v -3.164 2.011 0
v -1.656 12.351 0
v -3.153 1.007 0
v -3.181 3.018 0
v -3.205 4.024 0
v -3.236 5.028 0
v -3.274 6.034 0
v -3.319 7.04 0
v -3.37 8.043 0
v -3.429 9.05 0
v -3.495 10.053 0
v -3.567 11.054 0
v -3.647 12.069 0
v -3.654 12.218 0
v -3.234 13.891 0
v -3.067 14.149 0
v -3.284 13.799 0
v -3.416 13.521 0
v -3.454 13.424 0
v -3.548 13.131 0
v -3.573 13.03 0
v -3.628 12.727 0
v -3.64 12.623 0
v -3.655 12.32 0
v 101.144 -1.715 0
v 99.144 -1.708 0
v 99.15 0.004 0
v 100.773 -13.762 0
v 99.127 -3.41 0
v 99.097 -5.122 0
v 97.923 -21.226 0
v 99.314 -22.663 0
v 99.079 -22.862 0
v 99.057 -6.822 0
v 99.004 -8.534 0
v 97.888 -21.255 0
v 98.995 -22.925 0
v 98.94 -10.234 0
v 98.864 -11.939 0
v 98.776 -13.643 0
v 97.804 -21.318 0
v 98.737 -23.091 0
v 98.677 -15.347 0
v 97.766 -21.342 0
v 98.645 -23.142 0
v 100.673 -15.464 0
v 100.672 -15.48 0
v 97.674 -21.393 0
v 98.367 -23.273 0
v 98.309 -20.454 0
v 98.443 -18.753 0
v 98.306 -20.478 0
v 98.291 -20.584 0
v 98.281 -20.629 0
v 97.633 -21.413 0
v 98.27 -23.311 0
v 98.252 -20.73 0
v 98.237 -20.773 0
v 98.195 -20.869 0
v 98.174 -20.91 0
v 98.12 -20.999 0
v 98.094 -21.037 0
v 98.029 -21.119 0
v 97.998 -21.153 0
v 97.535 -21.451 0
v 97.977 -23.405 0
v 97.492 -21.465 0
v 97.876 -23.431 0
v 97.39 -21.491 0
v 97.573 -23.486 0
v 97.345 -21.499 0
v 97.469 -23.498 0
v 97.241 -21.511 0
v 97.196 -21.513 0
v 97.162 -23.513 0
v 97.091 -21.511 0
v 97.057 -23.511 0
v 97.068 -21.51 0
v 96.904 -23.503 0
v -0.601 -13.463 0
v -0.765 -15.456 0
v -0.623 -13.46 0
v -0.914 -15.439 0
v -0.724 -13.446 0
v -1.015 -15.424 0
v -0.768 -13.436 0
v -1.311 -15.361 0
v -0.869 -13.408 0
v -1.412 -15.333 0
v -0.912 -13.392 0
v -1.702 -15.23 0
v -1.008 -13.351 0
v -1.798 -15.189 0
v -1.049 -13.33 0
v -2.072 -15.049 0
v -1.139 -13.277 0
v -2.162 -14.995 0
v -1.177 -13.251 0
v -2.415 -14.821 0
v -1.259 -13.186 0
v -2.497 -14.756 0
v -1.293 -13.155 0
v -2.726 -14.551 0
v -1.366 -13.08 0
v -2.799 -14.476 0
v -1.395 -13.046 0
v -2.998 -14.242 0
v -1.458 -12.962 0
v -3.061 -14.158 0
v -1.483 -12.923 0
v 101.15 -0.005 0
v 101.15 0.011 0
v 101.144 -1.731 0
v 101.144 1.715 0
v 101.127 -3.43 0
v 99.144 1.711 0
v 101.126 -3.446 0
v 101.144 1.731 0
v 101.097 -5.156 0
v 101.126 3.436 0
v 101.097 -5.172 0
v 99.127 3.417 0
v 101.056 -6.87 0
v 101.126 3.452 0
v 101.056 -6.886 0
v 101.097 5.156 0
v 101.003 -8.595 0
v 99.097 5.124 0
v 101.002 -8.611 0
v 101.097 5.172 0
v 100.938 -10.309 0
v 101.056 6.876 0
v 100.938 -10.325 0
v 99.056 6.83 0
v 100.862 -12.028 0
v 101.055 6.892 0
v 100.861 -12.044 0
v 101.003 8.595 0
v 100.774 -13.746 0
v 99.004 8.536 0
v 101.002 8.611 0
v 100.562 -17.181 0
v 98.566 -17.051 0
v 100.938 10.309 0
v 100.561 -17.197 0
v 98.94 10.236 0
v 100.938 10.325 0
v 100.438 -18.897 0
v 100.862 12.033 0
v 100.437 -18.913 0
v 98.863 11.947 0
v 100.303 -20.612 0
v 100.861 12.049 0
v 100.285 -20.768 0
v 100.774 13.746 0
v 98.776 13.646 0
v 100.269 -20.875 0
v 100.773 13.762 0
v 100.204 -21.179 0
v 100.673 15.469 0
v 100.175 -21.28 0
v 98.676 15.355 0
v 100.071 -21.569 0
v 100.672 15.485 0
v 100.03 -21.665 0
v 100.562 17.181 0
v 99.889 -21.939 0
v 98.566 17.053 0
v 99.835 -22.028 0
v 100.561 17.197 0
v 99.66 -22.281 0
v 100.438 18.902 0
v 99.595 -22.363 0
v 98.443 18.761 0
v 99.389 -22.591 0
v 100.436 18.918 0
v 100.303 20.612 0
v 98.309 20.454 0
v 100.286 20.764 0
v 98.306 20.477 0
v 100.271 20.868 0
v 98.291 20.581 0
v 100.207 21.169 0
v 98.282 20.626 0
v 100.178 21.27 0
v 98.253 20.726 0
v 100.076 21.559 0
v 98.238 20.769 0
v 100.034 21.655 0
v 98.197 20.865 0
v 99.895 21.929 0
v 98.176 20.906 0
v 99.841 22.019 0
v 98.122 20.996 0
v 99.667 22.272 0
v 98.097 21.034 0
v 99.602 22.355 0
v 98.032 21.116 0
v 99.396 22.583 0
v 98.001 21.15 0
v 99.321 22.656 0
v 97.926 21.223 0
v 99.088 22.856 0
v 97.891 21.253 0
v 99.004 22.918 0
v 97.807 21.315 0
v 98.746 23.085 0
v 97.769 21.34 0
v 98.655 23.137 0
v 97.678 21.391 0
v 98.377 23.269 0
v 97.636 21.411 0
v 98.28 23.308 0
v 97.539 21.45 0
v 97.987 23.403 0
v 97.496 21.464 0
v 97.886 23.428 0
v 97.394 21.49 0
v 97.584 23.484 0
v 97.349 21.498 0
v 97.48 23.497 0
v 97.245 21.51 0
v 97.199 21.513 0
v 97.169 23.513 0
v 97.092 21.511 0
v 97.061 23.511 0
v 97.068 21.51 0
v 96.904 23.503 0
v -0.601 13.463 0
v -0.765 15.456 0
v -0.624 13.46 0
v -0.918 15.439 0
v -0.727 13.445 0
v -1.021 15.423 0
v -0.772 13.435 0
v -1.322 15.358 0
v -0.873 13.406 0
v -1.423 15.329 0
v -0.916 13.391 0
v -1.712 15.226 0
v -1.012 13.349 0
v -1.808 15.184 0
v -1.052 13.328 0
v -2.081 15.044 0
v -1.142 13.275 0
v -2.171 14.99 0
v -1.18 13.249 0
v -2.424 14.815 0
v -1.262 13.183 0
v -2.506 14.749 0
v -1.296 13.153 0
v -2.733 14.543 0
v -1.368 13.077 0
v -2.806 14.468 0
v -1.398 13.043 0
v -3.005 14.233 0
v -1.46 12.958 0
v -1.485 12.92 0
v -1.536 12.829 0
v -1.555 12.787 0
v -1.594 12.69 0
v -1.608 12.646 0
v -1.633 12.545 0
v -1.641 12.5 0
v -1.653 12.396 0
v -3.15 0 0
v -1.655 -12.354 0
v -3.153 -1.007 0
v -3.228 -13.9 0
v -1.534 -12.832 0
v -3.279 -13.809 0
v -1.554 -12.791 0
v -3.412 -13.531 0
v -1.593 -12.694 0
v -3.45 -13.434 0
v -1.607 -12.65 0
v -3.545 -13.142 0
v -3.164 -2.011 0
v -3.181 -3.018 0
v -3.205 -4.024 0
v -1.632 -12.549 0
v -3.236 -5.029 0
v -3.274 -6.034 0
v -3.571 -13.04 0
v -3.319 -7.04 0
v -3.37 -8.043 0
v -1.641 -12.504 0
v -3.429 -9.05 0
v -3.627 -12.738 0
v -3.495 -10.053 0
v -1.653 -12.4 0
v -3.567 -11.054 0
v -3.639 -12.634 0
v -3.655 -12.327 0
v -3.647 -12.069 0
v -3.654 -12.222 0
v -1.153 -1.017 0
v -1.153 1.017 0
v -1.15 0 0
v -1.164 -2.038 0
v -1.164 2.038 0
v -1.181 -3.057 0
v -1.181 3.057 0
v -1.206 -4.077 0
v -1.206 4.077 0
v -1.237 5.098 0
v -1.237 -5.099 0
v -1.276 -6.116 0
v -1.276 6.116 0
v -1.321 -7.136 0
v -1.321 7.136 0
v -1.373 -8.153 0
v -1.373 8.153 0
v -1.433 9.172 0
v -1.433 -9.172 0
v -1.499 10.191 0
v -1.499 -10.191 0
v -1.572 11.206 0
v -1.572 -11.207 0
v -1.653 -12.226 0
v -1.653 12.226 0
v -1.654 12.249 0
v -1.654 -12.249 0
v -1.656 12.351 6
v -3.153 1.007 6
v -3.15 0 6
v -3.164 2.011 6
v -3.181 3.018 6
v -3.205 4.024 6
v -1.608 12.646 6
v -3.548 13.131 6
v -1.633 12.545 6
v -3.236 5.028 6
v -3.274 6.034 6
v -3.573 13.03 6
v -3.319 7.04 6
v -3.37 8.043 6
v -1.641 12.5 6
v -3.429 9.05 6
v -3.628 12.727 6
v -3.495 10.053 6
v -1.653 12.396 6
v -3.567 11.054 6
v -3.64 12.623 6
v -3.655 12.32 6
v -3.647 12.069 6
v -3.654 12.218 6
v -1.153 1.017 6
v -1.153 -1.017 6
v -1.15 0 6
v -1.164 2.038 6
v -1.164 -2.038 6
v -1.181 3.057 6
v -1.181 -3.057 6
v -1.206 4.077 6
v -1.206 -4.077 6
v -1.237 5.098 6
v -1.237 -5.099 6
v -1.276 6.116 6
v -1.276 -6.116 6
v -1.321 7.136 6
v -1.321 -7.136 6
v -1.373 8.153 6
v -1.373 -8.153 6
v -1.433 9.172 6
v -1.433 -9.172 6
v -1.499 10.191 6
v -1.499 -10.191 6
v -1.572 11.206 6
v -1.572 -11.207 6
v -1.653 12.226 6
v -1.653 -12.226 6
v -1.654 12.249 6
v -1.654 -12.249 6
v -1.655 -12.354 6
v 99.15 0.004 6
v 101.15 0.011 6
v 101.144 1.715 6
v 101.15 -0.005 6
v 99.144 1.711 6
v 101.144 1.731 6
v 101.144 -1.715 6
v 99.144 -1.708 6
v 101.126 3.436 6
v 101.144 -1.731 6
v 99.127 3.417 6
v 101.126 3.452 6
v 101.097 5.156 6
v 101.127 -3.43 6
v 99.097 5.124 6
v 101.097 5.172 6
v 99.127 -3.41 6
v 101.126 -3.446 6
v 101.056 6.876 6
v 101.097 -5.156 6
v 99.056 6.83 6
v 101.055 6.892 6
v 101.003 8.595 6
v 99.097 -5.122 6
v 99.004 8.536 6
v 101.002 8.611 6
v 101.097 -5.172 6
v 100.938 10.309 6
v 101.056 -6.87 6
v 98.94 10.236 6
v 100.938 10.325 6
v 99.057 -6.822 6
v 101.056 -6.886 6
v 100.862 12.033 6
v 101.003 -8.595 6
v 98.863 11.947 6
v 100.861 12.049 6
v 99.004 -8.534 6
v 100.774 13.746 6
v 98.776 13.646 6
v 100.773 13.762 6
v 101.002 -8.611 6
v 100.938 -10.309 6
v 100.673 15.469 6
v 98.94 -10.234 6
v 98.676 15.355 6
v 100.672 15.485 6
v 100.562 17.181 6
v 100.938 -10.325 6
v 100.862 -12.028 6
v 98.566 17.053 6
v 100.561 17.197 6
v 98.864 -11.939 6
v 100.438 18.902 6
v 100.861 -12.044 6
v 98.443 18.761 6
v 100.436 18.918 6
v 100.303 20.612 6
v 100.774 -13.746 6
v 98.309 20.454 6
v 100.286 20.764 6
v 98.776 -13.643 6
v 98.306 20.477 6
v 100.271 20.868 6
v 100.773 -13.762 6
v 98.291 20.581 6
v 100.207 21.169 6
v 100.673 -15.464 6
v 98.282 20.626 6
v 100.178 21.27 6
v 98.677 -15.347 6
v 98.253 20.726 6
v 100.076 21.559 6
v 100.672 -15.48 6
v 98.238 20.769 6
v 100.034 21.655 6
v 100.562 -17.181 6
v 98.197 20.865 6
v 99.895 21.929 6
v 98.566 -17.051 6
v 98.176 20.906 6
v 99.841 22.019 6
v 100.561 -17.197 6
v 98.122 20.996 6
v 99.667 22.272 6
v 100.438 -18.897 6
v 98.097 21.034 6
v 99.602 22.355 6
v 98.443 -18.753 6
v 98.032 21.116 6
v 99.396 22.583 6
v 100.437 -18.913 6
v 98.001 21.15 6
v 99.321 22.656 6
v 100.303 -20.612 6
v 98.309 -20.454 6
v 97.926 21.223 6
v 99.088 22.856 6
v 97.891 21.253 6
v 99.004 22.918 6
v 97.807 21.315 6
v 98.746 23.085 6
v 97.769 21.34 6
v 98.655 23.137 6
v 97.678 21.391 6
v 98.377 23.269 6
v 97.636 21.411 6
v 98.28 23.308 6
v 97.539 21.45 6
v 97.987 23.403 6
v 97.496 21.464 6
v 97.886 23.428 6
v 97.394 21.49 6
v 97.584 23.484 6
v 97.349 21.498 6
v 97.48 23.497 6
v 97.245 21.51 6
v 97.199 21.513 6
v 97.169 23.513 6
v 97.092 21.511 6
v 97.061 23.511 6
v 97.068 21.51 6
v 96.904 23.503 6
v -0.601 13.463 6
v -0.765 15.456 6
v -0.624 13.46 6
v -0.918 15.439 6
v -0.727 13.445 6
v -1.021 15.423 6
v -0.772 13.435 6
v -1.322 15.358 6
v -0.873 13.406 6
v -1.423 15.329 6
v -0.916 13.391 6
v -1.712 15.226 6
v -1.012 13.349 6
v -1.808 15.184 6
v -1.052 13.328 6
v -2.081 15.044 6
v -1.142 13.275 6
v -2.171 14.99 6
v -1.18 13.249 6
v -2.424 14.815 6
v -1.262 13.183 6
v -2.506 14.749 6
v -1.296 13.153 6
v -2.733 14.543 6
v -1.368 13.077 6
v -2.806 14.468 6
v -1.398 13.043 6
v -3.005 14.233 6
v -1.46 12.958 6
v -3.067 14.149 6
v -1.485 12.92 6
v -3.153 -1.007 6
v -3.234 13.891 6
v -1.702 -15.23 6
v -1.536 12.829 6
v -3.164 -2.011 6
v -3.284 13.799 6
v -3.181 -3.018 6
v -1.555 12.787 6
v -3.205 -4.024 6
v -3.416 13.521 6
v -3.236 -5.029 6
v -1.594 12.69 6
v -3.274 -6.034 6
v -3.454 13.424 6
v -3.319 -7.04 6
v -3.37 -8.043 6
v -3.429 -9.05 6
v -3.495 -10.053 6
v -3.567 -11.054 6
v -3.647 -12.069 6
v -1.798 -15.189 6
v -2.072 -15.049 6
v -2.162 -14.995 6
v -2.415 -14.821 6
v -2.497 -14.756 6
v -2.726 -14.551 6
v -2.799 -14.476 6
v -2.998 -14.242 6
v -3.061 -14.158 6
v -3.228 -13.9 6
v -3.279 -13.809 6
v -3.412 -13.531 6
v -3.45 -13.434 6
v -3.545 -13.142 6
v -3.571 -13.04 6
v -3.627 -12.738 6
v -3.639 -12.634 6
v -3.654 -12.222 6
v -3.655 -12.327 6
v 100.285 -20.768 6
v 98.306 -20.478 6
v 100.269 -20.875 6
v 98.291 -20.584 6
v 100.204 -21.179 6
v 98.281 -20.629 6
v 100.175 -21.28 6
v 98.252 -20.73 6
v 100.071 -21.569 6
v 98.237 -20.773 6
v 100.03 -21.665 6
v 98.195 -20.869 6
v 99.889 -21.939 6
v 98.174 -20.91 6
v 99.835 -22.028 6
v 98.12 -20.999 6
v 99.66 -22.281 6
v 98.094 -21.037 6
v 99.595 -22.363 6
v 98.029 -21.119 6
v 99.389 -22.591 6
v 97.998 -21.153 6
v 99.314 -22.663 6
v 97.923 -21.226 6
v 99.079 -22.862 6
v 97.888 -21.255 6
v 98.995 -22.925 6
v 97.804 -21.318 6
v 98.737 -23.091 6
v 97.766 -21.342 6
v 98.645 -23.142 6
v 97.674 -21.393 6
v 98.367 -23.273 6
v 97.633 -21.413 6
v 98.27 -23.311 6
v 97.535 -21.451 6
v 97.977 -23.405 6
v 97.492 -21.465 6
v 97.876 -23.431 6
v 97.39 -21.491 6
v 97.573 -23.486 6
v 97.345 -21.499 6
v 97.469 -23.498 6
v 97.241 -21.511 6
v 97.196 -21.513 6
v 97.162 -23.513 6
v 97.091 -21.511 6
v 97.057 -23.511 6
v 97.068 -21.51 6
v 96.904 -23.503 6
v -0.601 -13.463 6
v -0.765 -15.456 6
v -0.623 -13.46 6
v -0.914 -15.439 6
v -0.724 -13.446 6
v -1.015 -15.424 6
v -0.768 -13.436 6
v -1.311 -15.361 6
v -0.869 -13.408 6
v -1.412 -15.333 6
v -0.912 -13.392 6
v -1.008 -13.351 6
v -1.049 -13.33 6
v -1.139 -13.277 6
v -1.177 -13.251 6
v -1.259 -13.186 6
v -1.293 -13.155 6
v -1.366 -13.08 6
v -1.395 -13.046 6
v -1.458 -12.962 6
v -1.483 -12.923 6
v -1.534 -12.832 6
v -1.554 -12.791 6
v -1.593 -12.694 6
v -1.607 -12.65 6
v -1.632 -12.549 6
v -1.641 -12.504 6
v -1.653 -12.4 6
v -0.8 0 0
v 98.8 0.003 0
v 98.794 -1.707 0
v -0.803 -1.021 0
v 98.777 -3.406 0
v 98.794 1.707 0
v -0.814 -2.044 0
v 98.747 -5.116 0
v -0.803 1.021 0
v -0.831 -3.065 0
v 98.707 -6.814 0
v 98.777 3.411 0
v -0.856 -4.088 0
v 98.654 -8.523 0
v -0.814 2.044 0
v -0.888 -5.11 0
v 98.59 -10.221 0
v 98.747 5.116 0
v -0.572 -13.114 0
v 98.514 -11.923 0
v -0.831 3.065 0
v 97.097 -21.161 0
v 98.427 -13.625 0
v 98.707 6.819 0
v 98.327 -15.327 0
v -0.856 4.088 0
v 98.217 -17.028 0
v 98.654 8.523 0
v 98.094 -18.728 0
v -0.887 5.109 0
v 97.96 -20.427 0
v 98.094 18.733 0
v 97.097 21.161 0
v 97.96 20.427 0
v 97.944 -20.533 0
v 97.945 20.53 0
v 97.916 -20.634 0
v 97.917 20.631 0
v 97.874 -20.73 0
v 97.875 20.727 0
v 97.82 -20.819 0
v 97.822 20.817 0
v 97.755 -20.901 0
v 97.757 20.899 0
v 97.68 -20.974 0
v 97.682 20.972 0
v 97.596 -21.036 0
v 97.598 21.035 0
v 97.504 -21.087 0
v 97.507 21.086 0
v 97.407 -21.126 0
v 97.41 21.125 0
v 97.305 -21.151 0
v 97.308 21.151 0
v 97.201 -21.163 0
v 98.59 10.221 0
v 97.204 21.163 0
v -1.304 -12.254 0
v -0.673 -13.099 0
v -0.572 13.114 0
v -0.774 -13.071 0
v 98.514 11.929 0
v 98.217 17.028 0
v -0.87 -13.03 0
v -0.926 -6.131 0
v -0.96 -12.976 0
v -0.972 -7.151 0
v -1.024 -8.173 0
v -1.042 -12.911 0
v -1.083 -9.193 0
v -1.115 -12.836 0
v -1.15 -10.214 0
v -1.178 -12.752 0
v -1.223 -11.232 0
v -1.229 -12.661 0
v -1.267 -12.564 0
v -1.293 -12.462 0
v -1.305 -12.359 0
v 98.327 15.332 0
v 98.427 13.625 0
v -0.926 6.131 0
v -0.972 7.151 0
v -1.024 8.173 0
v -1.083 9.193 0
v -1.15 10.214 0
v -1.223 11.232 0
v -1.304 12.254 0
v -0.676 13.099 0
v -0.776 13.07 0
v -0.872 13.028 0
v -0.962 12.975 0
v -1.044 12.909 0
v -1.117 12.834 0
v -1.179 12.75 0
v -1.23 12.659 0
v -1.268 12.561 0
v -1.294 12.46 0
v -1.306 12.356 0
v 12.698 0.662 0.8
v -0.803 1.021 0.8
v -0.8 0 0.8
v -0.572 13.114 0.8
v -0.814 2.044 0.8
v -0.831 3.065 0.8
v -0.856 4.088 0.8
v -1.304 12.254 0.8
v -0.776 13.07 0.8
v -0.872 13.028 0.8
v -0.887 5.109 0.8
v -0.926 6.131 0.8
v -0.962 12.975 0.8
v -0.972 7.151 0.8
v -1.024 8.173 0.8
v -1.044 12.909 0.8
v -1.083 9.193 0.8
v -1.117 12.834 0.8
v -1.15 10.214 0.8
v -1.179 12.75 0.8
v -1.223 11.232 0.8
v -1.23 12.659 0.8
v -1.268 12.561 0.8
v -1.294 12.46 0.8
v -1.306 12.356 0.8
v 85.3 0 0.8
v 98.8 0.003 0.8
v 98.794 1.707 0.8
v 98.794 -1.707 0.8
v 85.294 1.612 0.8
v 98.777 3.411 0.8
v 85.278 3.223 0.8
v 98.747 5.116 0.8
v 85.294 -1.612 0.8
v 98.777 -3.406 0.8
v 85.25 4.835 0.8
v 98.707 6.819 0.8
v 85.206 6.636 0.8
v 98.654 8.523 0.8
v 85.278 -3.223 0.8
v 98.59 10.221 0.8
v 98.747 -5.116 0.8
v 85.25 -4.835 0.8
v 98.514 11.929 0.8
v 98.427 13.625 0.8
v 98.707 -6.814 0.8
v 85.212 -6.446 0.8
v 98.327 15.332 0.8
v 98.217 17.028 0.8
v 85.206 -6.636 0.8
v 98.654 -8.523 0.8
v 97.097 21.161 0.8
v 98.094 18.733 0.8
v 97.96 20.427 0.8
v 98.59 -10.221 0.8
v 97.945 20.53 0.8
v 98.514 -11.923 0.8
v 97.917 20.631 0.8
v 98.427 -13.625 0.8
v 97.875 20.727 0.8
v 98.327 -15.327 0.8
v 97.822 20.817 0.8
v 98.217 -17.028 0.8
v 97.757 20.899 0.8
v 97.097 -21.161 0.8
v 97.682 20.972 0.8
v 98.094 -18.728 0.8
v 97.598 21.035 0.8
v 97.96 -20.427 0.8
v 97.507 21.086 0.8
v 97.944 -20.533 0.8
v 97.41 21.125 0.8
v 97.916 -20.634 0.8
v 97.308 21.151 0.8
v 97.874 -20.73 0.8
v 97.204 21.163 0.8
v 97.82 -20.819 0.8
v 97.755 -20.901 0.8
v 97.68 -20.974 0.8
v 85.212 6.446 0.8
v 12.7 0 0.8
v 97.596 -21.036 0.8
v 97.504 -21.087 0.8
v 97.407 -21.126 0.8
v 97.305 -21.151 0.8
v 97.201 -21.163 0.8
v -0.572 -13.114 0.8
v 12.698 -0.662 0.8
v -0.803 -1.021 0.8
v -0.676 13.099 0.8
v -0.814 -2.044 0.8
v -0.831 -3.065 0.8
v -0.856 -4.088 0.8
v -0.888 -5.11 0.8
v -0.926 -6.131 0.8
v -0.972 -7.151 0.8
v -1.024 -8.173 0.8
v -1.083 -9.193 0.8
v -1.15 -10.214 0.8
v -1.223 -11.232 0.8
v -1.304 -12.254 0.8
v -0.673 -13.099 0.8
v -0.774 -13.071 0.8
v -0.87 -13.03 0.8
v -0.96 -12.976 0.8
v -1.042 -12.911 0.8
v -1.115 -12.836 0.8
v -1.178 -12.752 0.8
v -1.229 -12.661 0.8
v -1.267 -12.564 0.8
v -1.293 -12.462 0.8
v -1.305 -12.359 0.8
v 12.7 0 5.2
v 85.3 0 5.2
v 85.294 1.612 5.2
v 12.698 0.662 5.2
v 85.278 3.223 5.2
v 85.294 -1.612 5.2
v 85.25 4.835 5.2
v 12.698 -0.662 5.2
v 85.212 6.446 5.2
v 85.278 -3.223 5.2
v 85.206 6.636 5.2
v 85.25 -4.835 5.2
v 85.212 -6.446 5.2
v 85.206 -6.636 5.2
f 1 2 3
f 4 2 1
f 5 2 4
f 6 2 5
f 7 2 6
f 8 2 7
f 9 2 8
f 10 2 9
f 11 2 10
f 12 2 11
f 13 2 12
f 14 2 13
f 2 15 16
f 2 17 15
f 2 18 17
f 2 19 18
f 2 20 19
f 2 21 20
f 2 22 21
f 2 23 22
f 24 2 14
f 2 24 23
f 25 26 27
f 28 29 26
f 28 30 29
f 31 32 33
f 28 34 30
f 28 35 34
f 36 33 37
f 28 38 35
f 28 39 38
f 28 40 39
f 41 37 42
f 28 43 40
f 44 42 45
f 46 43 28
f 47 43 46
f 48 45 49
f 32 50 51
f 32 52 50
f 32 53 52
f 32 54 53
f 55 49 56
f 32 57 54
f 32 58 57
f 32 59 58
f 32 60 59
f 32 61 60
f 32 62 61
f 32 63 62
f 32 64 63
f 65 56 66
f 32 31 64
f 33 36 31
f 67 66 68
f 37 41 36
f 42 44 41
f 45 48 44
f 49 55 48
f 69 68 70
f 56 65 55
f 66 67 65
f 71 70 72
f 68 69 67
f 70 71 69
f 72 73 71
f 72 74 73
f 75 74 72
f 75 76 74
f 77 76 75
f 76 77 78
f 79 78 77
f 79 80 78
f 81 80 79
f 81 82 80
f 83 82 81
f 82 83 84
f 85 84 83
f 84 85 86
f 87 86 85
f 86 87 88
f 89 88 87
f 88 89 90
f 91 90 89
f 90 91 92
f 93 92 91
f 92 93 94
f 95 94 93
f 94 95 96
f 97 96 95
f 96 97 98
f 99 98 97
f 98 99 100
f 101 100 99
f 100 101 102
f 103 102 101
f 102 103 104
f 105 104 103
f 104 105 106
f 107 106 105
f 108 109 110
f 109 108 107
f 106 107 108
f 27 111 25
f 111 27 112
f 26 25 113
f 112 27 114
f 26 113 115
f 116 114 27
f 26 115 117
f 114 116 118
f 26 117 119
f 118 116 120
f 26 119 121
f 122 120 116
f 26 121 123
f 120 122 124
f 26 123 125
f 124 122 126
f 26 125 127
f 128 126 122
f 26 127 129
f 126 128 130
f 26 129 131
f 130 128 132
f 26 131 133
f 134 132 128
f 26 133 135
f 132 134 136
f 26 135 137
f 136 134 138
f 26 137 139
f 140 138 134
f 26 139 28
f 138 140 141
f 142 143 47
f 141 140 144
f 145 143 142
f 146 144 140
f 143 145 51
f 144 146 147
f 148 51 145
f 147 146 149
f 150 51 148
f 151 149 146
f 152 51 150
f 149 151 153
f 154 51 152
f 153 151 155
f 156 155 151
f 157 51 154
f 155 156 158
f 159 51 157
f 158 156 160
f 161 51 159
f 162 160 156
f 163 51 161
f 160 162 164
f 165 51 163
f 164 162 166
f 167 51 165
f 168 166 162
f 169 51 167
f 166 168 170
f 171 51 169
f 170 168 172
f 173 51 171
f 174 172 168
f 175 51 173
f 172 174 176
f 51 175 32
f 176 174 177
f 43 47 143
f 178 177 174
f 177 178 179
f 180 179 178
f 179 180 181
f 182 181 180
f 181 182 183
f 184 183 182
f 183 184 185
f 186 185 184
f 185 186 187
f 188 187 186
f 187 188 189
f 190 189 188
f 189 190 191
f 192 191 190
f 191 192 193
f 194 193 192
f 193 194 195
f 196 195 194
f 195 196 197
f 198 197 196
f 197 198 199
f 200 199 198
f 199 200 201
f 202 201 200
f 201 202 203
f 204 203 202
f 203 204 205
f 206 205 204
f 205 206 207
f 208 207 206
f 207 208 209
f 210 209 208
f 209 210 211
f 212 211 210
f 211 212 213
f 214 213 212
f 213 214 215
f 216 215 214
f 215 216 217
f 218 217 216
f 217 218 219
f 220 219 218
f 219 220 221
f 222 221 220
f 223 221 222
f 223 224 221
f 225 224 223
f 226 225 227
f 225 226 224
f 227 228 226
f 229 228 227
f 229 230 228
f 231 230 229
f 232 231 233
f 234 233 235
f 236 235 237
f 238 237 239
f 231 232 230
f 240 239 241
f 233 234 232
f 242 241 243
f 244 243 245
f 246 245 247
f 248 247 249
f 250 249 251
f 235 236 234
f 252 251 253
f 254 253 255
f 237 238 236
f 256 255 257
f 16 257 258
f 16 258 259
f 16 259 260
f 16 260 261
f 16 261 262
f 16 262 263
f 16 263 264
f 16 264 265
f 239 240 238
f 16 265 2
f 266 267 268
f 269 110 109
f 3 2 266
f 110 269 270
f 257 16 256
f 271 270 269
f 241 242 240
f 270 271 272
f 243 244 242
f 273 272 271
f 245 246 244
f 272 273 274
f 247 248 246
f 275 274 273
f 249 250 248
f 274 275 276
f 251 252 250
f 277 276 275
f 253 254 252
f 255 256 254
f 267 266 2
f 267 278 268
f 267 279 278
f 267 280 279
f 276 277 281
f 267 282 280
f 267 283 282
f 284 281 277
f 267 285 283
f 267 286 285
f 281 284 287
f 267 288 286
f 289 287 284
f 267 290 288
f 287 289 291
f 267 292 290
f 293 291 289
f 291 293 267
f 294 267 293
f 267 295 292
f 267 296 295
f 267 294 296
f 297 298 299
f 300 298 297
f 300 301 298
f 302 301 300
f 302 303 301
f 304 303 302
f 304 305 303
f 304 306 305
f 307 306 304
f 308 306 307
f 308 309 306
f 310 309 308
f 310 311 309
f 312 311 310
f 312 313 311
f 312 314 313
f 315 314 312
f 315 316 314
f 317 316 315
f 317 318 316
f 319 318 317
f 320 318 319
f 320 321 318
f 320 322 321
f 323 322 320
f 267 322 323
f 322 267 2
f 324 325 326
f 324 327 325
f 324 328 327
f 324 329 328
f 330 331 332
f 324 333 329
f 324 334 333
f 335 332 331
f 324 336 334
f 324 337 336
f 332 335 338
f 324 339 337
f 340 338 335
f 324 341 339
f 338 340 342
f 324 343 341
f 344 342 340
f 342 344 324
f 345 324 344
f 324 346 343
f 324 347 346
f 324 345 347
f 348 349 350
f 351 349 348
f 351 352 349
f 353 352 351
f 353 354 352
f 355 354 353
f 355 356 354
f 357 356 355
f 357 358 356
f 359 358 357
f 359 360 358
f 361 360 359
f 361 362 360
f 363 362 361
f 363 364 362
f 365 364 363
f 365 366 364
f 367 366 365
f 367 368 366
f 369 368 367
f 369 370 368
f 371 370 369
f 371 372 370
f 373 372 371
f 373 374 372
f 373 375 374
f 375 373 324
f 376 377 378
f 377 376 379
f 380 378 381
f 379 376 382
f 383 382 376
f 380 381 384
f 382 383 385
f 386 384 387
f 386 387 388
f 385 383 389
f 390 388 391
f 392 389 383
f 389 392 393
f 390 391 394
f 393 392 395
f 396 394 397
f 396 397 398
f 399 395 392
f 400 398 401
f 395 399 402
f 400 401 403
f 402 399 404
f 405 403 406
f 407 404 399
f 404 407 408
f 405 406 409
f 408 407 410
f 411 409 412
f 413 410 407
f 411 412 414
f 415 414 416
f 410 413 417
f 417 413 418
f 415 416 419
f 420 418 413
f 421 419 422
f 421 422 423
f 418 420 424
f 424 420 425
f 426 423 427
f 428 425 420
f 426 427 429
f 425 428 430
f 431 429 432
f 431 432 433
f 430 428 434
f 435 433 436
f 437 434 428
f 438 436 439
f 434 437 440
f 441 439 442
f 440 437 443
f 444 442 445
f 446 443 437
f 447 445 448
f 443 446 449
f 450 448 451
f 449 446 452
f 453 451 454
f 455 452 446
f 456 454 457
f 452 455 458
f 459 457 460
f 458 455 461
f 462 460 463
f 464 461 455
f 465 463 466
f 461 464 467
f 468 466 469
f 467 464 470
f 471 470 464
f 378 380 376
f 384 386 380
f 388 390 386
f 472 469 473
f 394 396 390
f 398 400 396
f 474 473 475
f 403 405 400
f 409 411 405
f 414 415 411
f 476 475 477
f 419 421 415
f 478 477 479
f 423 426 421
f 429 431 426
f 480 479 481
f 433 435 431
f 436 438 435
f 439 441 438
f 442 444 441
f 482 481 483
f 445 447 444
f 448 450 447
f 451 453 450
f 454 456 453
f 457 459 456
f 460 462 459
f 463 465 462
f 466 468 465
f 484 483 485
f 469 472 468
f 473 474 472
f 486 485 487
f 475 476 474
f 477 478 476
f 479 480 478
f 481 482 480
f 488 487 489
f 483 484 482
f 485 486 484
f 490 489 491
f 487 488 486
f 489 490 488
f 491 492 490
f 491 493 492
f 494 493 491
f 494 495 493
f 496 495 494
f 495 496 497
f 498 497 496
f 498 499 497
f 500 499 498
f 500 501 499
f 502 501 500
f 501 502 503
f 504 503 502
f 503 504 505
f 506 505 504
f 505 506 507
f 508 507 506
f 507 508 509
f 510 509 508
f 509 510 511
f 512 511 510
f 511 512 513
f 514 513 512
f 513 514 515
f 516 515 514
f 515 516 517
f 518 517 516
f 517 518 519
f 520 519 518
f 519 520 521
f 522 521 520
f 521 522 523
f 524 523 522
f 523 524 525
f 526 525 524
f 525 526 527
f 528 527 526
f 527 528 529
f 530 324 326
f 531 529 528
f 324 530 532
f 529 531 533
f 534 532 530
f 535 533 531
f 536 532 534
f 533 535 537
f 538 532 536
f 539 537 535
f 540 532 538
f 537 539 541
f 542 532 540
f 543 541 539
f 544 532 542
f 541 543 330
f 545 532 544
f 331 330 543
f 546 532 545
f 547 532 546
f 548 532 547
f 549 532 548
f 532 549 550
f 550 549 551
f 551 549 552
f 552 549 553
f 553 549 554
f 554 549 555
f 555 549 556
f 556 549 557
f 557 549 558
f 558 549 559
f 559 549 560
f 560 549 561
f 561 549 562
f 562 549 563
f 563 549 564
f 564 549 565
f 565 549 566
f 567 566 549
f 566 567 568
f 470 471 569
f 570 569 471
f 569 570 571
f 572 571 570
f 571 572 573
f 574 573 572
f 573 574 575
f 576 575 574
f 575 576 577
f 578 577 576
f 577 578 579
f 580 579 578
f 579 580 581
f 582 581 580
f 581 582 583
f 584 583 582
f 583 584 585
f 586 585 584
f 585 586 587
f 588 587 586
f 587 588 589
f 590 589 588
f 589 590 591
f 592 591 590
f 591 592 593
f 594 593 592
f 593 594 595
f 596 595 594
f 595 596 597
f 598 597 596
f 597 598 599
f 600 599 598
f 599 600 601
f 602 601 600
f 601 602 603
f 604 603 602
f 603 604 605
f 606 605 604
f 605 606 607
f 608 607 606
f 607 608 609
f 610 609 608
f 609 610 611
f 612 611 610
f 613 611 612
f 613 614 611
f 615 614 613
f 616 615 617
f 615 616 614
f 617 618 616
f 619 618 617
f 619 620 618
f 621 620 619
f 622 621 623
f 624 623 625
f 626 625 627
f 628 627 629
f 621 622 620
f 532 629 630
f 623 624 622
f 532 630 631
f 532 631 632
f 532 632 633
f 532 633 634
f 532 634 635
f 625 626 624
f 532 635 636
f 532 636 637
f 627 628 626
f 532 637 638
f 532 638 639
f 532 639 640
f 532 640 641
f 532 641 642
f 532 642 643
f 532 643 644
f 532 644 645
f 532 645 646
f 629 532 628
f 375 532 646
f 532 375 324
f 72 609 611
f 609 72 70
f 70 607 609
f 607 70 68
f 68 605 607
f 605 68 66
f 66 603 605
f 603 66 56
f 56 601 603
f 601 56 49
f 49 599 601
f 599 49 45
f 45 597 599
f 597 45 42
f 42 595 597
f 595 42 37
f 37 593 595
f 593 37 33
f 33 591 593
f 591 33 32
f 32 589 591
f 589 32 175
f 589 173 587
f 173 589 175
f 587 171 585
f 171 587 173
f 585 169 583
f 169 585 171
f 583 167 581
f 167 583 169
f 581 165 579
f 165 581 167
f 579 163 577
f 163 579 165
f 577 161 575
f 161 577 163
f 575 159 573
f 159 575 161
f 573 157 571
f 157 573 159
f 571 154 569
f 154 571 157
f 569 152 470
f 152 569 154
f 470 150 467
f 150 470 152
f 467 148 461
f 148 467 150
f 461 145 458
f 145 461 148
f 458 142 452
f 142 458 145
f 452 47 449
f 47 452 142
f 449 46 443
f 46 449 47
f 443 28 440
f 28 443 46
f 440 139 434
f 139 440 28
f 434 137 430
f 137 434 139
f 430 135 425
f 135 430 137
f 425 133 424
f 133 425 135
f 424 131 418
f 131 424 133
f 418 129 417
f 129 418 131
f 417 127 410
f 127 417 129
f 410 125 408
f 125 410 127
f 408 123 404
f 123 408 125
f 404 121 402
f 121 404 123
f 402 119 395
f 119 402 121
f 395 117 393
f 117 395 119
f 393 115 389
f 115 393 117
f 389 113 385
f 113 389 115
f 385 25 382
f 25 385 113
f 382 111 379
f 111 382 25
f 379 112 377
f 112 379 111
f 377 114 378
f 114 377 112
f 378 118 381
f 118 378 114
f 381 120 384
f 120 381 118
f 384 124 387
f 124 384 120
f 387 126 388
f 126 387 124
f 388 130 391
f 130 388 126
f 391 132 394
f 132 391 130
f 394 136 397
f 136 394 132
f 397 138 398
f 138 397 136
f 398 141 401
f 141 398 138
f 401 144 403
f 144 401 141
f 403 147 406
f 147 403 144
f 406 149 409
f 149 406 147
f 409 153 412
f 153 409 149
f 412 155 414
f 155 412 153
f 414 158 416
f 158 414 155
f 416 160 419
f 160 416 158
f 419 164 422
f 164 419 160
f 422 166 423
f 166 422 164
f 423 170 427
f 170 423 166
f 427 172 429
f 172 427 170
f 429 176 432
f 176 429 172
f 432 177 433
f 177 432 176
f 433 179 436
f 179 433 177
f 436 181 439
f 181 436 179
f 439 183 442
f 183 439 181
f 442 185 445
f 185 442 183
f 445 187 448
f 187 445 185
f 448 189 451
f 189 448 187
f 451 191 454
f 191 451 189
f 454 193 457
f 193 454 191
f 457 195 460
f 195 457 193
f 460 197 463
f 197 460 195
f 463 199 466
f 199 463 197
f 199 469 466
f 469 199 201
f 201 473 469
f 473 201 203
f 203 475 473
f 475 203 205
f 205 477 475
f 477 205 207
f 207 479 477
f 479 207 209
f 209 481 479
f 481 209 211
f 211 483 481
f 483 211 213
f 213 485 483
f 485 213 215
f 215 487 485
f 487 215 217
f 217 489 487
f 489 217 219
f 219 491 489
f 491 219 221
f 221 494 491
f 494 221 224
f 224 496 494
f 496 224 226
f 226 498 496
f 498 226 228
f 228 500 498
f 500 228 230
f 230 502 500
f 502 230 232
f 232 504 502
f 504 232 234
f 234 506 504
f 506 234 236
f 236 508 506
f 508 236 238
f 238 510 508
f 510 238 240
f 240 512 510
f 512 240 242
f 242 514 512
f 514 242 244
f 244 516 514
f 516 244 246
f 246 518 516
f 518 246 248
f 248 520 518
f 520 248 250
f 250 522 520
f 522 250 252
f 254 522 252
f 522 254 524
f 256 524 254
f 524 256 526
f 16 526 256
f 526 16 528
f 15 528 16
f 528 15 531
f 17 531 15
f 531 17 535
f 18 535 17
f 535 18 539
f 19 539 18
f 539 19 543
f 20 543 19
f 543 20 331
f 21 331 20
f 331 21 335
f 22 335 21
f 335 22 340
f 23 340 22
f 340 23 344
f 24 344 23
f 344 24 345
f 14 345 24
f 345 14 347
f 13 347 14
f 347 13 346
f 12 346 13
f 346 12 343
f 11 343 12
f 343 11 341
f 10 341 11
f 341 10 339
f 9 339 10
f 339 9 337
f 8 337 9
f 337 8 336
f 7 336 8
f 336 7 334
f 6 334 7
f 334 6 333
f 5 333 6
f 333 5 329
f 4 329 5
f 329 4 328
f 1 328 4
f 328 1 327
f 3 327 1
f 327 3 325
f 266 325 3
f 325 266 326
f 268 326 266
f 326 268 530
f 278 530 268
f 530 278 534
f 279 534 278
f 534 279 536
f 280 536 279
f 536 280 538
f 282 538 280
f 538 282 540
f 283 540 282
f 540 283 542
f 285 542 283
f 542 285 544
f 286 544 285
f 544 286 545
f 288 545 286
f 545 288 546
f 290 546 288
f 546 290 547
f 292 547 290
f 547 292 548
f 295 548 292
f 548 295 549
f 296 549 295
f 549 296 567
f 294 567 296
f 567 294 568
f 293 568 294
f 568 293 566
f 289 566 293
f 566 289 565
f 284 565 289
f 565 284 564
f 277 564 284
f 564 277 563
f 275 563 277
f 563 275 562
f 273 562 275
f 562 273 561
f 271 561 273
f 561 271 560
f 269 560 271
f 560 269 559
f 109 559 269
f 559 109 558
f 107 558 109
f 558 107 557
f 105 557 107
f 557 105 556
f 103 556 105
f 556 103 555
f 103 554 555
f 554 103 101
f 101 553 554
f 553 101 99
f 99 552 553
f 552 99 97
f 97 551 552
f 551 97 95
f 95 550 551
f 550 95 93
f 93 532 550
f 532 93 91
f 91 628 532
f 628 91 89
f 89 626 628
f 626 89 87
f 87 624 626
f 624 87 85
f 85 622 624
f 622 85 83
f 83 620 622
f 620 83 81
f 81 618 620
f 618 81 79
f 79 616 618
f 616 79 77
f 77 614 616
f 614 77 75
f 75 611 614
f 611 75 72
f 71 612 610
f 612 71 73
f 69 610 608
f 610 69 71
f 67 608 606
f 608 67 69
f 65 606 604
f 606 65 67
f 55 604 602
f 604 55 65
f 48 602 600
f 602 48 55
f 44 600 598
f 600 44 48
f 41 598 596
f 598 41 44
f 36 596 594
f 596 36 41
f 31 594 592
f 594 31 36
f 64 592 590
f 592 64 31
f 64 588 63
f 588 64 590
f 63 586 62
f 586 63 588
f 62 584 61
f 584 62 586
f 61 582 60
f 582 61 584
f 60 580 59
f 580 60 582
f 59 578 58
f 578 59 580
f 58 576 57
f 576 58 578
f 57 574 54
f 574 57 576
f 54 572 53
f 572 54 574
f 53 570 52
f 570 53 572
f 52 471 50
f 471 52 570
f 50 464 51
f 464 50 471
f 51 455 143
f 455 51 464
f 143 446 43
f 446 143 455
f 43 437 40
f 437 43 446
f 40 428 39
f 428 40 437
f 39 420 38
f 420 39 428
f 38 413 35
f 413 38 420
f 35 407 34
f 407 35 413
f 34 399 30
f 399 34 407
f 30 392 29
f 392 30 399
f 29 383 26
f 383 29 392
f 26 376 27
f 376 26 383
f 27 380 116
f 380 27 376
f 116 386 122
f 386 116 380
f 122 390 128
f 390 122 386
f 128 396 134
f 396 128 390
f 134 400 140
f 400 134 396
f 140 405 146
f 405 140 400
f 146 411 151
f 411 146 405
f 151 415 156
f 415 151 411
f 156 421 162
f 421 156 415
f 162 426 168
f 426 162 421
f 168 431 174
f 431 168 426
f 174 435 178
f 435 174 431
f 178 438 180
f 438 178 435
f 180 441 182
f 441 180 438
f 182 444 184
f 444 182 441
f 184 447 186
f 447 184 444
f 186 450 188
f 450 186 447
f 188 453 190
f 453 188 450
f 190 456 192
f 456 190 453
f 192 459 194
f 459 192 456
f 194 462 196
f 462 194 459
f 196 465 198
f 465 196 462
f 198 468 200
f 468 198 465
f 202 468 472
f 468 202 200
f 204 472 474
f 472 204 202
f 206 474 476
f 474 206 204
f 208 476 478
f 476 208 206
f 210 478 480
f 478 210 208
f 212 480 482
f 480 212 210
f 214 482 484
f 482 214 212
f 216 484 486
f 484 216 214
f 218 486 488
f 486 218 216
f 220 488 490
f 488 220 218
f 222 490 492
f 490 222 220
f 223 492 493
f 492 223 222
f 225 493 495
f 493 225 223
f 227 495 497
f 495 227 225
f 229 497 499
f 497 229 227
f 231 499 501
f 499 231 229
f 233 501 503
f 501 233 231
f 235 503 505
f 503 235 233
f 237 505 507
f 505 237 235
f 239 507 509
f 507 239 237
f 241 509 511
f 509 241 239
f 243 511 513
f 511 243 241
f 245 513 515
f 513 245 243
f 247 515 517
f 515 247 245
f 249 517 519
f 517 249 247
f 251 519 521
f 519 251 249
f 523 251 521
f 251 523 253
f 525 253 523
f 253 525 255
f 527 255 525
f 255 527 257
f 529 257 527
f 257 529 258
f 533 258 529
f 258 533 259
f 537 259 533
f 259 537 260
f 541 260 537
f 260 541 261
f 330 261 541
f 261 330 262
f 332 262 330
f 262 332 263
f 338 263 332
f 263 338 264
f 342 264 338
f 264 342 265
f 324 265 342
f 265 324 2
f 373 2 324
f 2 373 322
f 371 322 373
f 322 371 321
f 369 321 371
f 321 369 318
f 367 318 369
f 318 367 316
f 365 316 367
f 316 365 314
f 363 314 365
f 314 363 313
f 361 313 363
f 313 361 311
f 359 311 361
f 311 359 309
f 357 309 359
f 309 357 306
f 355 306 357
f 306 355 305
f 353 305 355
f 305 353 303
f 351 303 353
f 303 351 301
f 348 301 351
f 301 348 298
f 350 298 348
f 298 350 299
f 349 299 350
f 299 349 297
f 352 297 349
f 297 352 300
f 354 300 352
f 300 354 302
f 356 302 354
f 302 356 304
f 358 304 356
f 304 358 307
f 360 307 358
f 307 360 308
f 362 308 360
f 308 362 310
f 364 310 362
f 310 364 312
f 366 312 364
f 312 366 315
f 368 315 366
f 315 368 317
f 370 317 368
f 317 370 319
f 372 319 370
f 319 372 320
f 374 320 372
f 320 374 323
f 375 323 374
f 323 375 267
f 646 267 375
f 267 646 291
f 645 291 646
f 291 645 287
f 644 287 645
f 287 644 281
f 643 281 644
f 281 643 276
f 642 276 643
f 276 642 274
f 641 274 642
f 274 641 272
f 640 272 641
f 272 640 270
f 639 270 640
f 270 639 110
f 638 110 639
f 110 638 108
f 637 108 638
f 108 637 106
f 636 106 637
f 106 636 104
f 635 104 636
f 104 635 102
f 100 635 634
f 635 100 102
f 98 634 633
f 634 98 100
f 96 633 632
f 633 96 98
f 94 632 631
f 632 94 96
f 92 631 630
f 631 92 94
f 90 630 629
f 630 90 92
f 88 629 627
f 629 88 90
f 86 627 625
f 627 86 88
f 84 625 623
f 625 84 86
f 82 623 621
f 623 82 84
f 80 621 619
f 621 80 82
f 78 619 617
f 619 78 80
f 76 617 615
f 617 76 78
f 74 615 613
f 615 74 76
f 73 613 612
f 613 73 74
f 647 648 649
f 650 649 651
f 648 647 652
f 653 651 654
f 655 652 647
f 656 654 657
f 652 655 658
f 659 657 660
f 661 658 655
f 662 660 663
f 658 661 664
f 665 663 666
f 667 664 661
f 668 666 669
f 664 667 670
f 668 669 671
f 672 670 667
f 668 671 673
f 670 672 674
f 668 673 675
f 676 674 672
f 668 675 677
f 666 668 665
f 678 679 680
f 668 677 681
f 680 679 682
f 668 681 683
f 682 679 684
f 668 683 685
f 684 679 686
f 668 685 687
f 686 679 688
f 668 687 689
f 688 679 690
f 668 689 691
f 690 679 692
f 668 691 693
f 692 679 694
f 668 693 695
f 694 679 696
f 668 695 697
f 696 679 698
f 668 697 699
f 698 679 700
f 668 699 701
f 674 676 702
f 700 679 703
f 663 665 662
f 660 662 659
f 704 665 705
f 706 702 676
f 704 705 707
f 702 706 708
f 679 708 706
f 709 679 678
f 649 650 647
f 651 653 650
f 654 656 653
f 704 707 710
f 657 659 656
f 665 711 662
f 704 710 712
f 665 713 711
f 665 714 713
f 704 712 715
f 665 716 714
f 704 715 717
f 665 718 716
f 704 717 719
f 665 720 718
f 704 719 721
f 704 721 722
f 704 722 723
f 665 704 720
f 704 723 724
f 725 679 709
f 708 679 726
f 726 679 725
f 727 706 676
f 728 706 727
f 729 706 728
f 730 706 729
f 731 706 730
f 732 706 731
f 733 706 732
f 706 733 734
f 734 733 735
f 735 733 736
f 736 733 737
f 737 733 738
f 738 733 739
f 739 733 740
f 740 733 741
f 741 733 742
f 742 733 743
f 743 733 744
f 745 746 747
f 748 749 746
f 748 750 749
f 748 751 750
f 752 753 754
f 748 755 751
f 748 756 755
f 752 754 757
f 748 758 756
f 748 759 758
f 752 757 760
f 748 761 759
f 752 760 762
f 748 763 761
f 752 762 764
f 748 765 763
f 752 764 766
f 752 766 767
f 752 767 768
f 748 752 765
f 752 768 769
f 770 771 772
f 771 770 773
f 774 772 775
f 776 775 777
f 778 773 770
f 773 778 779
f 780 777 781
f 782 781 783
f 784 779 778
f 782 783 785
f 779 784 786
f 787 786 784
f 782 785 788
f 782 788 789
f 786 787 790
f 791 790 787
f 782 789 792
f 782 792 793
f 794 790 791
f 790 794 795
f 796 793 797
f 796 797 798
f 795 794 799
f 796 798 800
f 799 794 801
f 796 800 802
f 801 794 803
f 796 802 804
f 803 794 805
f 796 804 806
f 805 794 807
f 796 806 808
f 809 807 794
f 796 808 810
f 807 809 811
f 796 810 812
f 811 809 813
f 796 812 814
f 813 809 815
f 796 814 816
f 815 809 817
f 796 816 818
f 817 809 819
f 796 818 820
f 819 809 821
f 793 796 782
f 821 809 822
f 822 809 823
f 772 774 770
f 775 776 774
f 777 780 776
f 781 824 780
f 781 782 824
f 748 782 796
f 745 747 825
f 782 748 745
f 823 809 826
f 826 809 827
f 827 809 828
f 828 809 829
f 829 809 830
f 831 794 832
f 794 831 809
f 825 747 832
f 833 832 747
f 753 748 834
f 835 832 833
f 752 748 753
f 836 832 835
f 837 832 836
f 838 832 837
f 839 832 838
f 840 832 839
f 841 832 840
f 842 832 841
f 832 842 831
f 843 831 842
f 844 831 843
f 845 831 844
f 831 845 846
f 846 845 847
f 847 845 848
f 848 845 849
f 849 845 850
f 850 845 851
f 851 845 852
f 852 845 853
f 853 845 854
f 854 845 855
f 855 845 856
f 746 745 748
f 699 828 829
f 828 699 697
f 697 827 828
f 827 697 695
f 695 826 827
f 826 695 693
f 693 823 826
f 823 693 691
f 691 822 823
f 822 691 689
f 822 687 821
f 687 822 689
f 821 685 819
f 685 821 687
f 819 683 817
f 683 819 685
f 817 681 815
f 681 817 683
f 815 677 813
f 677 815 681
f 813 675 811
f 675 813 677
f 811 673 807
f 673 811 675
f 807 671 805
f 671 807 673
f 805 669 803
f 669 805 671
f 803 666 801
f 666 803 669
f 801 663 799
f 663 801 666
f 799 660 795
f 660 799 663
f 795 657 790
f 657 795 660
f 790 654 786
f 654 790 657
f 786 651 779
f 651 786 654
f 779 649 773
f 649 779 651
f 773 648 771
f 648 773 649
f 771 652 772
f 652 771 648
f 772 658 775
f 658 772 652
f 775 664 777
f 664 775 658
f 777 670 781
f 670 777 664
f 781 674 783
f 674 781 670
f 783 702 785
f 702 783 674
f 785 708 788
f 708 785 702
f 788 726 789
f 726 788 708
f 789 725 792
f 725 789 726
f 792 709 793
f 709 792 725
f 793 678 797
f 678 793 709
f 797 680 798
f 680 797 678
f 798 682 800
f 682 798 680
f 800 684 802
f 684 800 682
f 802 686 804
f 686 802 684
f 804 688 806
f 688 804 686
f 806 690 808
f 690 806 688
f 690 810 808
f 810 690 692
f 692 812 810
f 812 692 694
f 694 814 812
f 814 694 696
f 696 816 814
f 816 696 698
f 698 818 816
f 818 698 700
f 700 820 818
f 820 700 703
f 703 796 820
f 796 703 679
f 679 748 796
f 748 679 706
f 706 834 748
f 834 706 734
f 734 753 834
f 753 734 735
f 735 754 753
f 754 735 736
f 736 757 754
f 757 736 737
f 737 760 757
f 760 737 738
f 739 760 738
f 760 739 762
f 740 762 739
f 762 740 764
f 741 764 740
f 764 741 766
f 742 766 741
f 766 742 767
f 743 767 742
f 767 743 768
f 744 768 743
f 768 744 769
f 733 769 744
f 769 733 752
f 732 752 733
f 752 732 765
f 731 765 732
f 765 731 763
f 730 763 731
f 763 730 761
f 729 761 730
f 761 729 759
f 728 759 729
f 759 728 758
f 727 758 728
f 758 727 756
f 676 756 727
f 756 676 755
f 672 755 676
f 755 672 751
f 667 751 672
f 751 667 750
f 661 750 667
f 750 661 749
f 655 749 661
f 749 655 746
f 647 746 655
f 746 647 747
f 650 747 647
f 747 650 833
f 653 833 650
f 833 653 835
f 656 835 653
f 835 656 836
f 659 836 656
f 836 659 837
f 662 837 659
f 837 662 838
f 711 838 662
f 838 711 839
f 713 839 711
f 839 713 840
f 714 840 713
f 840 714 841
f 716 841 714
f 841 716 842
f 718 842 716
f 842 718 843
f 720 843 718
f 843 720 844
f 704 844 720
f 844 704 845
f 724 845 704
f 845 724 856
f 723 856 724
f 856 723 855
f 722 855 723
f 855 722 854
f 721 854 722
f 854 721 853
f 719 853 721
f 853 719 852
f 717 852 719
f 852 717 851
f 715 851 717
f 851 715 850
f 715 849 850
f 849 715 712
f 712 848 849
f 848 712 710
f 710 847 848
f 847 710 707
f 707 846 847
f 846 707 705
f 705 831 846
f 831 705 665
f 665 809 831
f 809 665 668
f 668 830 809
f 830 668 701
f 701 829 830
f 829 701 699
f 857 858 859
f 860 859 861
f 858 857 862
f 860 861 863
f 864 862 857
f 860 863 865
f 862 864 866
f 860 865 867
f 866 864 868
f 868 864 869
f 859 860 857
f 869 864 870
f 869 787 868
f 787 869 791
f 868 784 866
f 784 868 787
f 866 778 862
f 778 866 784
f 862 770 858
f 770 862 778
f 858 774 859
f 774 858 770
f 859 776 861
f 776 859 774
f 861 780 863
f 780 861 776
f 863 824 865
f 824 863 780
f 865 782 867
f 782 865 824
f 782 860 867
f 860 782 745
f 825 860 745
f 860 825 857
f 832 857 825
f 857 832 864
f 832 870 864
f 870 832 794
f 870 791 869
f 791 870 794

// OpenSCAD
// Gen-DW — fit coupon (bay part): O20/O5 THROUGH pockets at carrier thickness (test on a steel offcut), 608 seat,
// D-flat bore, gap shim, and one bobbin-bay slice (bobbin footprint + bay_clear) to test former fit.
include <parameters.scad>;
$fn = 48;
// D-flat keyed bore: flat faces +X (angle 0 = magnet pocket 0 = index notch)
module dflat_bore(h) {
    intersection() {
        cylinder(d=shaft_bore, h=h);
        translate([-shaft_bore, -shaft_bore, 0]) cube([shaft_bore + dflat_x, 2*shaft_bore, h]);
    }
}
module sector_2d(r_in, r_out, ang) {
    polygon([
        for (a = [-ang/2 : ang/24 : ang/2]) [r_in*cos(a), r_in*sin(a)],
        for (a = [ang/2 : -ang/24 : -ang/2]) [r_out*cos(a), r_out*sin(a)]
    ]);
}
module footprint_2d() { offset(r=wall) sector_2d(coil_id_r, coil_od_r, span_deg); }
module hub_2d()       { offset(delta=-coil_core_inset) sector_2d(coil_id_r, coil_od_r, span_deg); }

// bay slice at FULL stator thickness with one bobbin BASE printed IN PLACE inside it (bay_clear gap): this is the
// print-in-place test for the one-plate stator. After printing, the base must pop out with finger pressure; if it is fused,
// print coil_former.stl separately (print-packs/parts/) instead of using the in-place bases.
translate([-coil_id_r, 0, 0]) {
    difference() {
        linear_extrude(stator_thick) offset(r=bay_clear + 2) footprint_2d();
        translate([0, 0, -0.1]) linear_extrude(stator_thick + 0.2) offset(r=bay_clear) footprint_2d();
    }
    union() {
        linear_extrude(flange_t) footprint_2d();
        translate([0, 0, flange_t - 0.01]) linear_extrude(former_web + 0.01) hub_2d();
    }
}
